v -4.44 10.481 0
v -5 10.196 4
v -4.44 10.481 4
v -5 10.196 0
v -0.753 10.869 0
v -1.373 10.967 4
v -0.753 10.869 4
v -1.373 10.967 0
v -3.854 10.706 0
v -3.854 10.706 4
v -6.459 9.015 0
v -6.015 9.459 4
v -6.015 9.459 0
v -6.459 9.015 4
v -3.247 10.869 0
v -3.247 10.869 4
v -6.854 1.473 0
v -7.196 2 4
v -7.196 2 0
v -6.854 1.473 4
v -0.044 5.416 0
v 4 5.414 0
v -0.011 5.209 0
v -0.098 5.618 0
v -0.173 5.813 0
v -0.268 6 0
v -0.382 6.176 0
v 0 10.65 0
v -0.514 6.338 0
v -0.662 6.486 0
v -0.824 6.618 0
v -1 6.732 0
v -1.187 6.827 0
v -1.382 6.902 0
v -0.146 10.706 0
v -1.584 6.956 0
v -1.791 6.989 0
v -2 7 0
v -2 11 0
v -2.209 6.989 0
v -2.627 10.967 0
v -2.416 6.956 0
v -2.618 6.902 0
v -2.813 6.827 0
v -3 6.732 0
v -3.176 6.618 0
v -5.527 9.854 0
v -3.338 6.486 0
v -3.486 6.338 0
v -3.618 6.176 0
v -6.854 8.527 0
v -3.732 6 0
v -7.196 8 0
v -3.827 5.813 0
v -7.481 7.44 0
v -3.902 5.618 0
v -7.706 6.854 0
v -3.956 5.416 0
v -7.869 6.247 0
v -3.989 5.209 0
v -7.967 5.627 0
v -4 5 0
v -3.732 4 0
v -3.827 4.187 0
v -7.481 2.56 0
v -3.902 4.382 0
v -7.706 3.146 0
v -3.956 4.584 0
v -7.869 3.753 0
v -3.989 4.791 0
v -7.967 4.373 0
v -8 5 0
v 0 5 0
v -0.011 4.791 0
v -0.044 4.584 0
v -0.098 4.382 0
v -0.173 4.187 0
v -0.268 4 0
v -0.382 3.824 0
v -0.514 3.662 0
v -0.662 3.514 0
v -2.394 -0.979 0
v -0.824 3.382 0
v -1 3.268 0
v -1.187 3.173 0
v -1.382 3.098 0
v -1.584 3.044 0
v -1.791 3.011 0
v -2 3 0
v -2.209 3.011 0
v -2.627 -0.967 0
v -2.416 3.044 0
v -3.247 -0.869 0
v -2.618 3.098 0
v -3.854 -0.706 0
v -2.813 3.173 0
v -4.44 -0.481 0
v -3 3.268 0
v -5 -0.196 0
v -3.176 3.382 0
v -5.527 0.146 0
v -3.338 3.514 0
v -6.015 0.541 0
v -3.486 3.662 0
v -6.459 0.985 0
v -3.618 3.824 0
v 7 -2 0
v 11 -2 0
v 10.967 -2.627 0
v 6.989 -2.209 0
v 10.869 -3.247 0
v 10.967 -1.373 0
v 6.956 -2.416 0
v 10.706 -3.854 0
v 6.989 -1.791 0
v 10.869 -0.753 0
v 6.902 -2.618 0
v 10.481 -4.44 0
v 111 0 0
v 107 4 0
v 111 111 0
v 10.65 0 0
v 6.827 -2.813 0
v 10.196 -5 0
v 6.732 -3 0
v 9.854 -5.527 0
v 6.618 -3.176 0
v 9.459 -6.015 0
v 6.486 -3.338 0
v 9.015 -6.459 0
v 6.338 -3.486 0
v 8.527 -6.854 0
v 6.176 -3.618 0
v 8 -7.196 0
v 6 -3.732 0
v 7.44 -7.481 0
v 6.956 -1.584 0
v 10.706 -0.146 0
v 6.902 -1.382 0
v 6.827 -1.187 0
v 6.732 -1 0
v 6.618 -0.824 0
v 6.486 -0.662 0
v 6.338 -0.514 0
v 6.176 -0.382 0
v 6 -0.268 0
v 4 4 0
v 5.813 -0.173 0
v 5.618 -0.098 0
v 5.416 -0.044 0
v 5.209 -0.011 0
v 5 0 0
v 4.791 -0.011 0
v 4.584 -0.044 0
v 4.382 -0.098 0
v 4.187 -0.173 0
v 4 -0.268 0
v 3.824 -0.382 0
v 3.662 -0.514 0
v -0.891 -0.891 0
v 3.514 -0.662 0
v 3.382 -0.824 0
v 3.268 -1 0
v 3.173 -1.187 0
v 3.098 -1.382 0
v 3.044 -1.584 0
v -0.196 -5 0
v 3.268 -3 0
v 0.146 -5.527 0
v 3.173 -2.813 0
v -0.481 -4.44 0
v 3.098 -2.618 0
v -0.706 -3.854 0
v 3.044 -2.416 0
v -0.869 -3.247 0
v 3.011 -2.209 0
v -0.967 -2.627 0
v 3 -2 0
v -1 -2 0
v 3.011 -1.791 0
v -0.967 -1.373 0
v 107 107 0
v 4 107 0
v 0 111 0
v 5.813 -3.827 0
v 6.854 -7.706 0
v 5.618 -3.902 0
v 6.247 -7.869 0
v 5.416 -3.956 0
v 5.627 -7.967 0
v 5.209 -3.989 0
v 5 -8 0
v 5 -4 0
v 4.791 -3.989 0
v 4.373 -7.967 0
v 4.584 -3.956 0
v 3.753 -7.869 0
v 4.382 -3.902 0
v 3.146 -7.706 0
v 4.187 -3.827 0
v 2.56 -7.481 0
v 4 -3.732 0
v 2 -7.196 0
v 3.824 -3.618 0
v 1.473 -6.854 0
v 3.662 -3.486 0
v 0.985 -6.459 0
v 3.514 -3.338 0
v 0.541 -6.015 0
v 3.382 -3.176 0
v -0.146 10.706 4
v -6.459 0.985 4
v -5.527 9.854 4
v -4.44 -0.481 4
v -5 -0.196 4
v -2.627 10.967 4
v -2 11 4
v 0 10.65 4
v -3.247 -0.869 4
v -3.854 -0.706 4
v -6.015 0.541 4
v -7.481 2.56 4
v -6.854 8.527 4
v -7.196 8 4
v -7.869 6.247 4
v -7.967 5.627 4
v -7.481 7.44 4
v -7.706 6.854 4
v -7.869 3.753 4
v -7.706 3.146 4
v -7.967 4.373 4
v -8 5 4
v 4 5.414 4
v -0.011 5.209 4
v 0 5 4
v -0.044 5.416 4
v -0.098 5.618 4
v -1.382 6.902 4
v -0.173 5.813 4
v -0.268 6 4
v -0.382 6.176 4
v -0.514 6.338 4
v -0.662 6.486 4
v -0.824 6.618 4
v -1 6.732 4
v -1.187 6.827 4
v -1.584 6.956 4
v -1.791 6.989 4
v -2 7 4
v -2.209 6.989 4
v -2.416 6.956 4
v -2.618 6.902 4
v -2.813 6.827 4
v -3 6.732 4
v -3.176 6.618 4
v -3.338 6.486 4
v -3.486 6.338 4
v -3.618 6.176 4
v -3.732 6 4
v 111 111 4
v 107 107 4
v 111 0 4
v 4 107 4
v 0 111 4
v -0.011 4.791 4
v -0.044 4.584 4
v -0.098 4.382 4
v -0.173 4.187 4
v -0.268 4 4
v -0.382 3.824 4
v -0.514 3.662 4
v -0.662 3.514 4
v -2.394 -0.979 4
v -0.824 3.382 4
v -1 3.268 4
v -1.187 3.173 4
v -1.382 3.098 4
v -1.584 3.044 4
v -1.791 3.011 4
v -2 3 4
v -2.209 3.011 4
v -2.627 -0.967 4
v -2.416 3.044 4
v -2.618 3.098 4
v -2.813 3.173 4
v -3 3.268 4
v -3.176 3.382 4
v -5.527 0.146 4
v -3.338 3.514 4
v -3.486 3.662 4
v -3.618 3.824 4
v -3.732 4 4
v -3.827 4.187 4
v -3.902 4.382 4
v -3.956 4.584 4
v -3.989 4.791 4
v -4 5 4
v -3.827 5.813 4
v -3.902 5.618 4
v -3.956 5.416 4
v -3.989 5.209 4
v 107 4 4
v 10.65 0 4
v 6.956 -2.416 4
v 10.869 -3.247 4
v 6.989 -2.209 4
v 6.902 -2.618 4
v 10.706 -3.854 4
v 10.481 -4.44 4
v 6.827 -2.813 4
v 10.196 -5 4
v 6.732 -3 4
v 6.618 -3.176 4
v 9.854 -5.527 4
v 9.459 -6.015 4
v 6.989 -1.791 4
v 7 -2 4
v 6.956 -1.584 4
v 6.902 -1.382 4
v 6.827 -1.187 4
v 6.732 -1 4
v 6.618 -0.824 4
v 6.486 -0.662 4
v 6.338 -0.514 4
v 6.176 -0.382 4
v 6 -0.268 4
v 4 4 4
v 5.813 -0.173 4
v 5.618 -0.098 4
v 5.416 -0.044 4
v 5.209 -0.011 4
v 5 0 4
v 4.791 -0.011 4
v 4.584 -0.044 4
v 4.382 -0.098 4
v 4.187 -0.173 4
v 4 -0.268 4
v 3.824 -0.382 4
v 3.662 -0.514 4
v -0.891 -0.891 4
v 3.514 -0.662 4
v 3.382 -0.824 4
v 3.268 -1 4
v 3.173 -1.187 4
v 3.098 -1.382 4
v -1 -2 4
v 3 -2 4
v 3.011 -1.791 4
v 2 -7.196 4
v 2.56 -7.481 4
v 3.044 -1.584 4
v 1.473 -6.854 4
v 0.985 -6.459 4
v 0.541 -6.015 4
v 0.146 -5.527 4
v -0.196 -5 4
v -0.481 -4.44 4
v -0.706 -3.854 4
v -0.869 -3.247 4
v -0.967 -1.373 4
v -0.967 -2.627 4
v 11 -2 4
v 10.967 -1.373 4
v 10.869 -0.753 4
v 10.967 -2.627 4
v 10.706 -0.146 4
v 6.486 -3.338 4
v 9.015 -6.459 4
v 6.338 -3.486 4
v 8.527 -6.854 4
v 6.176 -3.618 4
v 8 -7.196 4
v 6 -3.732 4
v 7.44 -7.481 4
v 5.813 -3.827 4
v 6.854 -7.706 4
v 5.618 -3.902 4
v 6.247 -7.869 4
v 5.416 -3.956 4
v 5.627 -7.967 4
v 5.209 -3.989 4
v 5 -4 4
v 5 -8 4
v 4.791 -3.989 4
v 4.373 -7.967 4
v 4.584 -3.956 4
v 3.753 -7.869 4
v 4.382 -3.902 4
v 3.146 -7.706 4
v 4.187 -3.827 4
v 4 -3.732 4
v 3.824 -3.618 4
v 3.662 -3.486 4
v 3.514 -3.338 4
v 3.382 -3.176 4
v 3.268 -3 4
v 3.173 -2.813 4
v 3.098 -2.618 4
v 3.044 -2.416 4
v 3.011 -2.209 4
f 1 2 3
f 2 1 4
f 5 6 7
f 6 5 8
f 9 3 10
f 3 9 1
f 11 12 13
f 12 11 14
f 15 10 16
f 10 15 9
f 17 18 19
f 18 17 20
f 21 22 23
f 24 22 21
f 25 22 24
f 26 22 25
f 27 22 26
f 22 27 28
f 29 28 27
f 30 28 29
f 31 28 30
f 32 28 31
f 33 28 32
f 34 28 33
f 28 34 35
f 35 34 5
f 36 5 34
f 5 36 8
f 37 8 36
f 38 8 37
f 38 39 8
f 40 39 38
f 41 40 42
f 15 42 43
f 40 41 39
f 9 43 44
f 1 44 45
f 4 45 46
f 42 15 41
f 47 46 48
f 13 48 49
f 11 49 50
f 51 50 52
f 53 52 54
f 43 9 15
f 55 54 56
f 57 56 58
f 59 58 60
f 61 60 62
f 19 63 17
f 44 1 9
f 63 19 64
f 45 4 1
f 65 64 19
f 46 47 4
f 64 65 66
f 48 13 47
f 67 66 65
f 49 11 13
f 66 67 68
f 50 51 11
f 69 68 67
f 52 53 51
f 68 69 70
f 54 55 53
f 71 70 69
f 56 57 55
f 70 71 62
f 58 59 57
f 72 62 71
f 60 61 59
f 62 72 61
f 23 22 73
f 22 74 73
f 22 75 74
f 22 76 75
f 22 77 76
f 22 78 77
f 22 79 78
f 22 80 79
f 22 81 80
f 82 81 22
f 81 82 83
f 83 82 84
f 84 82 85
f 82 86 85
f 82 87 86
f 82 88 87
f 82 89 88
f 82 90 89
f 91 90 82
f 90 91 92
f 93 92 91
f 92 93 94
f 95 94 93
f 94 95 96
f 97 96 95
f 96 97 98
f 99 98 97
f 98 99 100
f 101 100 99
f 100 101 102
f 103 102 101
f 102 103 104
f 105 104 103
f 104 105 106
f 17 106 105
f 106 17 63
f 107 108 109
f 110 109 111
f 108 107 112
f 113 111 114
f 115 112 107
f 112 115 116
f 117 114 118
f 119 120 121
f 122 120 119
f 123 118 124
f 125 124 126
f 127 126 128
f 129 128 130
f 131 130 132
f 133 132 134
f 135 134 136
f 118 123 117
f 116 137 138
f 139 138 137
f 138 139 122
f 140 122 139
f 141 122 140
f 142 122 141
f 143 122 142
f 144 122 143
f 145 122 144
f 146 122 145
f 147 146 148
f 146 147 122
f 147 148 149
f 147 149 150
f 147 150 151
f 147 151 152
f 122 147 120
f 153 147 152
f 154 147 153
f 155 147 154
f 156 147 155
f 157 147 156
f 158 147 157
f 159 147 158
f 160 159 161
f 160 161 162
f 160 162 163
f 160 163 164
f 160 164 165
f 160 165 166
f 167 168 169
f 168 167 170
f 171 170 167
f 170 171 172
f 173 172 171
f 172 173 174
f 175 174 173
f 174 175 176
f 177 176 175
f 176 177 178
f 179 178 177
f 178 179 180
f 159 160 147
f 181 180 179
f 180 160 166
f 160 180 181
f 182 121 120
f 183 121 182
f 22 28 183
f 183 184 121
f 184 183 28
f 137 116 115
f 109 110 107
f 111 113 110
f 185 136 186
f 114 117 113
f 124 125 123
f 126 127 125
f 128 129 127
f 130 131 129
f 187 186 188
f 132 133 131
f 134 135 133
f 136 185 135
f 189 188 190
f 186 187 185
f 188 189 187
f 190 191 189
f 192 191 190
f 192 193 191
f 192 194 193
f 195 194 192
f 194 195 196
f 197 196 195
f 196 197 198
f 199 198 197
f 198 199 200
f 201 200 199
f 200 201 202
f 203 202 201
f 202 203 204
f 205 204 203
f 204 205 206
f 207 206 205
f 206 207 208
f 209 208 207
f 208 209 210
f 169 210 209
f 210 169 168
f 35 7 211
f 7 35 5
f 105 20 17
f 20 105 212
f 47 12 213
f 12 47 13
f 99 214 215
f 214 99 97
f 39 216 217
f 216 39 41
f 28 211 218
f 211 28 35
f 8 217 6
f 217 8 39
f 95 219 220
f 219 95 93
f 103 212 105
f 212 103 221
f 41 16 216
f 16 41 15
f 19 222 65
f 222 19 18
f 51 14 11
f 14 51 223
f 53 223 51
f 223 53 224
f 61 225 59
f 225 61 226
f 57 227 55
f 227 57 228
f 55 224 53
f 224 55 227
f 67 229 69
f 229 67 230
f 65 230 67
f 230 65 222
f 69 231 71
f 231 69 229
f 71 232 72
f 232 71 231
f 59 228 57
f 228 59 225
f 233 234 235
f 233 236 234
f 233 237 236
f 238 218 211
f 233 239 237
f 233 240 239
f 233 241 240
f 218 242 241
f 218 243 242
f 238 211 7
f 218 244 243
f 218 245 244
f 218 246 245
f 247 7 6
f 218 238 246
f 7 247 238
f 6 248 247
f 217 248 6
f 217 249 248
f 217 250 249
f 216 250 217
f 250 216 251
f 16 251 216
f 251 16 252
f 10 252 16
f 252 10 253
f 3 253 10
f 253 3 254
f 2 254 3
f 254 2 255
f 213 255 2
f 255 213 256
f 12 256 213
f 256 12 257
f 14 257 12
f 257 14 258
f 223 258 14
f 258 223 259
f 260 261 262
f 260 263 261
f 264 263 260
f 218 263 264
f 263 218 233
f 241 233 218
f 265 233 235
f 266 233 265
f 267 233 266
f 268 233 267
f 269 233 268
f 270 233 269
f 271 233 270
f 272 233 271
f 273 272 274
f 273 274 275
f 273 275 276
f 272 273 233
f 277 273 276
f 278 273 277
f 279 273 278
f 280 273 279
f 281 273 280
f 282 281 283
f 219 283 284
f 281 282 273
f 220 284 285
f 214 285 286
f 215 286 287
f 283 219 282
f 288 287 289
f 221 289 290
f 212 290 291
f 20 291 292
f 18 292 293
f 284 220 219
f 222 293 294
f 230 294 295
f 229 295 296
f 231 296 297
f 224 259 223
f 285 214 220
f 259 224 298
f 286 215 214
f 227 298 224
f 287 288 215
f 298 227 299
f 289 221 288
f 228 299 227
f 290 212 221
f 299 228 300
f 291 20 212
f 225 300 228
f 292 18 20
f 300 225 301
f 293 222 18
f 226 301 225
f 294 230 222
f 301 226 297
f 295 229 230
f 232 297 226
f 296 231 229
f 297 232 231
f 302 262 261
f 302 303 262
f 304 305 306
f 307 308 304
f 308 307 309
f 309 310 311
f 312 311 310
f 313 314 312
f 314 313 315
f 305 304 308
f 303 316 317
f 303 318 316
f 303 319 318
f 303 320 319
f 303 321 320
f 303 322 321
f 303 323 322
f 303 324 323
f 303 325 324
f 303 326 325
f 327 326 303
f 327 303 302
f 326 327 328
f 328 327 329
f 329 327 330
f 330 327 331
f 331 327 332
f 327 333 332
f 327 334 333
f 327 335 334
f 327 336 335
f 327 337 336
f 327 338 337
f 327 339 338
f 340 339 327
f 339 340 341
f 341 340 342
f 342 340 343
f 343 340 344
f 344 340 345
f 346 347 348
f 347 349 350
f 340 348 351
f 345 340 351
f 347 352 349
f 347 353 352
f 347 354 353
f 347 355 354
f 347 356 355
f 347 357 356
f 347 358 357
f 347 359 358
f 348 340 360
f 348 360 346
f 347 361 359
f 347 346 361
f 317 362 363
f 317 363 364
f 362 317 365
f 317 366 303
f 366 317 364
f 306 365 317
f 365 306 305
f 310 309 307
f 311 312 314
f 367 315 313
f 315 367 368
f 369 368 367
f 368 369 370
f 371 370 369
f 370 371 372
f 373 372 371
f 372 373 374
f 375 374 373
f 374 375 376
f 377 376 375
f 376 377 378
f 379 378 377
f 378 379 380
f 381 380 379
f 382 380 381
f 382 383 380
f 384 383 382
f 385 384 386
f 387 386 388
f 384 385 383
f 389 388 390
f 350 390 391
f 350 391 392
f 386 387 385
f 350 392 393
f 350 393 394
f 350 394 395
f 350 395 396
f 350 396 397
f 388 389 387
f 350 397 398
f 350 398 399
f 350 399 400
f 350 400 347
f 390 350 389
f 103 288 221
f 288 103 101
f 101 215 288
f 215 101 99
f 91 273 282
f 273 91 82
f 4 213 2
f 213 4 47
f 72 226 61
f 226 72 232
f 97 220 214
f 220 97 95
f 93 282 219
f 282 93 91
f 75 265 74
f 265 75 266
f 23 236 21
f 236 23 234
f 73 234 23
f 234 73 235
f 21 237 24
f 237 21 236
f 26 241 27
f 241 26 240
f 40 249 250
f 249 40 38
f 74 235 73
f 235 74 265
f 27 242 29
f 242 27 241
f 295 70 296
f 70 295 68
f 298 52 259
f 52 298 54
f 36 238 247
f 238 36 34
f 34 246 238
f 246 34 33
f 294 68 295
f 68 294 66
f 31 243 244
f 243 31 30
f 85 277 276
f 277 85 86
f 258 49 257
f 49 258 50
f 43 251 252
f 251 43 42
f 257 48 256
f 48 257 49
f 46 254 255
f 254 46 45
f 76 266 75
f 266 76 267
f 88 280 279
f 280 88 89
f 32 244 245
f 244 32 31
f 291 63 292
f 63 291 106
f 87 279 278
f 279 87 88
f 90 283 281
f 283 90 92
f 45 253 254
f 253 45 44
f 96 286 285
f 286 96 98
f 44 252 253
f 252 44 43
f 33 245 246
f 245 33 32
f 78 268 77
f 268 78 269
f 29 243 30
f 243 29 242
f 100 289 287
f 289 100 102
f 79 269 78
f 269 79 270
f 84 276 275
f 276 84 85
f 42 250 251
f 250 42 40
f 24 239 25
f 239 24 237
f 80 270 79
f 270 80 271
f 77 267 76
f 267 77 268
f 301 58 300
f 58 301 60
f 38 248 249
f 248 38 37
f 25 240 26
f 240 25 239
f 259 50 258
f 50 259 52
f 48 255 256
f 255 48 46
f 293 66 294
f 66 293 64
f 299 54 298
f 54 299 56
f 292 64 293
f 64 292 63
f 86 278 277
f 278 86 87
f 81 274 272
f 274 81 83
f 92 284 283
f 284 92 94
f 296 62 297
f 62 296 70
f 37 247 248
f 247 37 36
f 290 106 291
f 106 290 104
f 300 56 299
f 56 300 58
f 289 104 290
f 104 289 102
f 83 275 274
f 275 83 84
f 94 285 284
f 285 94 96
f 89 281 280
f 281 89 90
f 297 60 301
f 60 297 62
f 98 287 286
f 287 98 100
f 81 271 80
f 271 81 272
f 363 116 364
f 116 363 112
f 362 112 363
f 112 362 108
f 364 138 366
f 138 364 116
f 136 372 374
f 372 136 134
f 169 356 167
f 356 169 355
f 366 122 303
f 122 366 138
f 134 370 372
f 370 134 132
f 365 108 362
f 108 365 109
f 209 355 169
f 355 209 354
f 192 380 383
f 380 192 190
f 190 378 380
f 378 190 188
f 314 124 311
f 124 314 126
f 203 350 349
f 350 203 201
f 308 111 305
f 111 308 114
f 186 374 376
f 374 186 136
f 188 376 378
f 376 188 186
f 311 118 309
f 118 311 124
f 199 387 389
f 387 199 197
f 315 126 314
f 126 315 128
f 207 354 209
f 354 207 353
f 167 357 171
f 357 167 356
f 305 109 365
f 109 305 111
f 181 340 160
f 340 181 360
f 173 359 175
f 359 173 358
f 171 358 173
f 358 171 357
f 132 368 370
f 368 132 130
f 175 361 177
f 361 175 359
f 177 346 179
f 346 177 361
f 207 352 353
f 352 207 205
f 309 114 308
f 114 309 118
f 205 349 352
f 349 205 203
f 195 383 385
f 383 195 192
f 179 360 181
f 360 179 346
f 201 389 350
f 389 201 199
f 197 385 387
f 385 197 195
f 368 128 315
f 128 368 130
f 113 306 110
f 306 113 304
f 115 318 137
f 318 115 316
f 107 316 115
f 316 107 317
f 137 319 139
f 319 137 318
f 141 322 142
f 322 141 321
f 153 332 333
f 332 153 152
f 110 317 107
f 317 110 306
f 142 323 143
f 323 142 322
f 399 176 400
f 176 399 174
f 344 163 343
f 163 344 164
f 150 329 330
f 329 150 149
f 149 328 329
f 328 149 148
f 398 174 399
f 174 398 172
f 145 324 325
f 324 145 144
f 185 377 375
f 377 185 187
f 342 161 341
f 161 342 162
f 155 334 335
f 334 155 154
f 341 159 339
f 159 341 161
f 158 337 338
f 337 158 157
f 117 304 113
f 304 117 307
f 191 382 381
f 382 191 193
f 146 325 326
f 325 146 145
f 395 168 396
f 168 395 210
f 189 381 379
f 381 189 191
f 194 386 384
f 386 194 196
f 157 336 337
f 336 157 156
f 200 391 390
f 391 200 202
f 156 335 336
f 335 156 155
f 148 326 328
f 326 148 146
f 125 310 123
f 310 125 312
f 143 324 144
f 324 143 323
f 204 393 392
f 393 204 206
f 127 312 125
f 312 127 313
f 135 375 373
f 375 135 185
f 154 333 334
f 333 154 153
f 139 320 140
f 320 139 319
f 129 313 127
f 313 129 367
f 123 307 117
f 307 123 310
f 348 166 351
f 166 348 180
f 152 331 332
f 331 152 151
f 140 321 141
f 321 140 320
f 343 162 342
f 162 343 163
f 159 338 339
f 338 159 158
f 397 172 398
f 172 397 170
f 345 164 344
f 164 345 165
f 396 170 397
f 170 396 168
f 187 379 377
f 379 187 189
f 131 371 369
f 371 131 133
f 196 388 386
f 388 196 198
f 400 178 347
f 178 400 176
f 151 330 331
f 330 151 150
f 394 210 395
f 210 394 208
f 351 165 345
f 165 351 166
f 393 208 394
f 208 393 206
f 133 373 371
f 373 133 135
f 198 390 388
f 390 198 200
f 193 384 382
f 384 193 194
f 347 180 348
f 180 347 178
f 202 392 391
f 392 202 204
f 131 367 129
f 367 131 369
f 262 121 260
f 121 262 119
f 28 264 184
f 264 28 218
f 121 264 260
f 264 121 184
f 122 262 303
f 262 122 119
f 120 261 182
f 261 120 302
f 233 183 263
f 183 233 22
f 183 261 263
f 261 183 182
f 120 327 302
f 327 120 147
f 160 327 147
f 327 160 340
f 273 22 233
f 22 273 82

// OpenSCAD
/*********** CLIP PILLAR **********************/

saeule = 100;       // width of the pillar
toleranz = 1.5;     // tolerance on each site
dicke = 4;          // material thickness



/******************** Processing *******************/

$fn = 60;

difference() {
    
    union() {
    
        cube([ saeule + ( toleranz * 2 ) + ( dicke * 2 ),
               saeule + ( toleranz * 2 ) + ( dicke * 2 ),
               dicke ]);
        
        translate([ -2, 1 + dicke, 0 ]) {
            difference() {
                
                cylinder( r = dicke + 2, h = dicke );
                
                cylinder( r = 2, h = dicke );
                
            }
        }
        
        translate([ 1 + dicke, -2, 0 ]) {
            difference() {
                
                cylinder( r = dicke + 2, h = dicke );
                
                cylinder( r = 2, h = dicke );
                
            }
        }
        
    }
    
    translate([ dicke, dicke, 0 ]) {
        cube([  saeule + ( toleranz * 2 ),
                saeule + ( toleranz * 2 ),
                dicke ]);
    }
    
    translate([ dicke * 5, dicke * 5, 0 ]) {
        rotate([ 0, 0, 135 ]) {
            cube([ 1, saeule, dicke ]);
        }
    }
    
}



    
